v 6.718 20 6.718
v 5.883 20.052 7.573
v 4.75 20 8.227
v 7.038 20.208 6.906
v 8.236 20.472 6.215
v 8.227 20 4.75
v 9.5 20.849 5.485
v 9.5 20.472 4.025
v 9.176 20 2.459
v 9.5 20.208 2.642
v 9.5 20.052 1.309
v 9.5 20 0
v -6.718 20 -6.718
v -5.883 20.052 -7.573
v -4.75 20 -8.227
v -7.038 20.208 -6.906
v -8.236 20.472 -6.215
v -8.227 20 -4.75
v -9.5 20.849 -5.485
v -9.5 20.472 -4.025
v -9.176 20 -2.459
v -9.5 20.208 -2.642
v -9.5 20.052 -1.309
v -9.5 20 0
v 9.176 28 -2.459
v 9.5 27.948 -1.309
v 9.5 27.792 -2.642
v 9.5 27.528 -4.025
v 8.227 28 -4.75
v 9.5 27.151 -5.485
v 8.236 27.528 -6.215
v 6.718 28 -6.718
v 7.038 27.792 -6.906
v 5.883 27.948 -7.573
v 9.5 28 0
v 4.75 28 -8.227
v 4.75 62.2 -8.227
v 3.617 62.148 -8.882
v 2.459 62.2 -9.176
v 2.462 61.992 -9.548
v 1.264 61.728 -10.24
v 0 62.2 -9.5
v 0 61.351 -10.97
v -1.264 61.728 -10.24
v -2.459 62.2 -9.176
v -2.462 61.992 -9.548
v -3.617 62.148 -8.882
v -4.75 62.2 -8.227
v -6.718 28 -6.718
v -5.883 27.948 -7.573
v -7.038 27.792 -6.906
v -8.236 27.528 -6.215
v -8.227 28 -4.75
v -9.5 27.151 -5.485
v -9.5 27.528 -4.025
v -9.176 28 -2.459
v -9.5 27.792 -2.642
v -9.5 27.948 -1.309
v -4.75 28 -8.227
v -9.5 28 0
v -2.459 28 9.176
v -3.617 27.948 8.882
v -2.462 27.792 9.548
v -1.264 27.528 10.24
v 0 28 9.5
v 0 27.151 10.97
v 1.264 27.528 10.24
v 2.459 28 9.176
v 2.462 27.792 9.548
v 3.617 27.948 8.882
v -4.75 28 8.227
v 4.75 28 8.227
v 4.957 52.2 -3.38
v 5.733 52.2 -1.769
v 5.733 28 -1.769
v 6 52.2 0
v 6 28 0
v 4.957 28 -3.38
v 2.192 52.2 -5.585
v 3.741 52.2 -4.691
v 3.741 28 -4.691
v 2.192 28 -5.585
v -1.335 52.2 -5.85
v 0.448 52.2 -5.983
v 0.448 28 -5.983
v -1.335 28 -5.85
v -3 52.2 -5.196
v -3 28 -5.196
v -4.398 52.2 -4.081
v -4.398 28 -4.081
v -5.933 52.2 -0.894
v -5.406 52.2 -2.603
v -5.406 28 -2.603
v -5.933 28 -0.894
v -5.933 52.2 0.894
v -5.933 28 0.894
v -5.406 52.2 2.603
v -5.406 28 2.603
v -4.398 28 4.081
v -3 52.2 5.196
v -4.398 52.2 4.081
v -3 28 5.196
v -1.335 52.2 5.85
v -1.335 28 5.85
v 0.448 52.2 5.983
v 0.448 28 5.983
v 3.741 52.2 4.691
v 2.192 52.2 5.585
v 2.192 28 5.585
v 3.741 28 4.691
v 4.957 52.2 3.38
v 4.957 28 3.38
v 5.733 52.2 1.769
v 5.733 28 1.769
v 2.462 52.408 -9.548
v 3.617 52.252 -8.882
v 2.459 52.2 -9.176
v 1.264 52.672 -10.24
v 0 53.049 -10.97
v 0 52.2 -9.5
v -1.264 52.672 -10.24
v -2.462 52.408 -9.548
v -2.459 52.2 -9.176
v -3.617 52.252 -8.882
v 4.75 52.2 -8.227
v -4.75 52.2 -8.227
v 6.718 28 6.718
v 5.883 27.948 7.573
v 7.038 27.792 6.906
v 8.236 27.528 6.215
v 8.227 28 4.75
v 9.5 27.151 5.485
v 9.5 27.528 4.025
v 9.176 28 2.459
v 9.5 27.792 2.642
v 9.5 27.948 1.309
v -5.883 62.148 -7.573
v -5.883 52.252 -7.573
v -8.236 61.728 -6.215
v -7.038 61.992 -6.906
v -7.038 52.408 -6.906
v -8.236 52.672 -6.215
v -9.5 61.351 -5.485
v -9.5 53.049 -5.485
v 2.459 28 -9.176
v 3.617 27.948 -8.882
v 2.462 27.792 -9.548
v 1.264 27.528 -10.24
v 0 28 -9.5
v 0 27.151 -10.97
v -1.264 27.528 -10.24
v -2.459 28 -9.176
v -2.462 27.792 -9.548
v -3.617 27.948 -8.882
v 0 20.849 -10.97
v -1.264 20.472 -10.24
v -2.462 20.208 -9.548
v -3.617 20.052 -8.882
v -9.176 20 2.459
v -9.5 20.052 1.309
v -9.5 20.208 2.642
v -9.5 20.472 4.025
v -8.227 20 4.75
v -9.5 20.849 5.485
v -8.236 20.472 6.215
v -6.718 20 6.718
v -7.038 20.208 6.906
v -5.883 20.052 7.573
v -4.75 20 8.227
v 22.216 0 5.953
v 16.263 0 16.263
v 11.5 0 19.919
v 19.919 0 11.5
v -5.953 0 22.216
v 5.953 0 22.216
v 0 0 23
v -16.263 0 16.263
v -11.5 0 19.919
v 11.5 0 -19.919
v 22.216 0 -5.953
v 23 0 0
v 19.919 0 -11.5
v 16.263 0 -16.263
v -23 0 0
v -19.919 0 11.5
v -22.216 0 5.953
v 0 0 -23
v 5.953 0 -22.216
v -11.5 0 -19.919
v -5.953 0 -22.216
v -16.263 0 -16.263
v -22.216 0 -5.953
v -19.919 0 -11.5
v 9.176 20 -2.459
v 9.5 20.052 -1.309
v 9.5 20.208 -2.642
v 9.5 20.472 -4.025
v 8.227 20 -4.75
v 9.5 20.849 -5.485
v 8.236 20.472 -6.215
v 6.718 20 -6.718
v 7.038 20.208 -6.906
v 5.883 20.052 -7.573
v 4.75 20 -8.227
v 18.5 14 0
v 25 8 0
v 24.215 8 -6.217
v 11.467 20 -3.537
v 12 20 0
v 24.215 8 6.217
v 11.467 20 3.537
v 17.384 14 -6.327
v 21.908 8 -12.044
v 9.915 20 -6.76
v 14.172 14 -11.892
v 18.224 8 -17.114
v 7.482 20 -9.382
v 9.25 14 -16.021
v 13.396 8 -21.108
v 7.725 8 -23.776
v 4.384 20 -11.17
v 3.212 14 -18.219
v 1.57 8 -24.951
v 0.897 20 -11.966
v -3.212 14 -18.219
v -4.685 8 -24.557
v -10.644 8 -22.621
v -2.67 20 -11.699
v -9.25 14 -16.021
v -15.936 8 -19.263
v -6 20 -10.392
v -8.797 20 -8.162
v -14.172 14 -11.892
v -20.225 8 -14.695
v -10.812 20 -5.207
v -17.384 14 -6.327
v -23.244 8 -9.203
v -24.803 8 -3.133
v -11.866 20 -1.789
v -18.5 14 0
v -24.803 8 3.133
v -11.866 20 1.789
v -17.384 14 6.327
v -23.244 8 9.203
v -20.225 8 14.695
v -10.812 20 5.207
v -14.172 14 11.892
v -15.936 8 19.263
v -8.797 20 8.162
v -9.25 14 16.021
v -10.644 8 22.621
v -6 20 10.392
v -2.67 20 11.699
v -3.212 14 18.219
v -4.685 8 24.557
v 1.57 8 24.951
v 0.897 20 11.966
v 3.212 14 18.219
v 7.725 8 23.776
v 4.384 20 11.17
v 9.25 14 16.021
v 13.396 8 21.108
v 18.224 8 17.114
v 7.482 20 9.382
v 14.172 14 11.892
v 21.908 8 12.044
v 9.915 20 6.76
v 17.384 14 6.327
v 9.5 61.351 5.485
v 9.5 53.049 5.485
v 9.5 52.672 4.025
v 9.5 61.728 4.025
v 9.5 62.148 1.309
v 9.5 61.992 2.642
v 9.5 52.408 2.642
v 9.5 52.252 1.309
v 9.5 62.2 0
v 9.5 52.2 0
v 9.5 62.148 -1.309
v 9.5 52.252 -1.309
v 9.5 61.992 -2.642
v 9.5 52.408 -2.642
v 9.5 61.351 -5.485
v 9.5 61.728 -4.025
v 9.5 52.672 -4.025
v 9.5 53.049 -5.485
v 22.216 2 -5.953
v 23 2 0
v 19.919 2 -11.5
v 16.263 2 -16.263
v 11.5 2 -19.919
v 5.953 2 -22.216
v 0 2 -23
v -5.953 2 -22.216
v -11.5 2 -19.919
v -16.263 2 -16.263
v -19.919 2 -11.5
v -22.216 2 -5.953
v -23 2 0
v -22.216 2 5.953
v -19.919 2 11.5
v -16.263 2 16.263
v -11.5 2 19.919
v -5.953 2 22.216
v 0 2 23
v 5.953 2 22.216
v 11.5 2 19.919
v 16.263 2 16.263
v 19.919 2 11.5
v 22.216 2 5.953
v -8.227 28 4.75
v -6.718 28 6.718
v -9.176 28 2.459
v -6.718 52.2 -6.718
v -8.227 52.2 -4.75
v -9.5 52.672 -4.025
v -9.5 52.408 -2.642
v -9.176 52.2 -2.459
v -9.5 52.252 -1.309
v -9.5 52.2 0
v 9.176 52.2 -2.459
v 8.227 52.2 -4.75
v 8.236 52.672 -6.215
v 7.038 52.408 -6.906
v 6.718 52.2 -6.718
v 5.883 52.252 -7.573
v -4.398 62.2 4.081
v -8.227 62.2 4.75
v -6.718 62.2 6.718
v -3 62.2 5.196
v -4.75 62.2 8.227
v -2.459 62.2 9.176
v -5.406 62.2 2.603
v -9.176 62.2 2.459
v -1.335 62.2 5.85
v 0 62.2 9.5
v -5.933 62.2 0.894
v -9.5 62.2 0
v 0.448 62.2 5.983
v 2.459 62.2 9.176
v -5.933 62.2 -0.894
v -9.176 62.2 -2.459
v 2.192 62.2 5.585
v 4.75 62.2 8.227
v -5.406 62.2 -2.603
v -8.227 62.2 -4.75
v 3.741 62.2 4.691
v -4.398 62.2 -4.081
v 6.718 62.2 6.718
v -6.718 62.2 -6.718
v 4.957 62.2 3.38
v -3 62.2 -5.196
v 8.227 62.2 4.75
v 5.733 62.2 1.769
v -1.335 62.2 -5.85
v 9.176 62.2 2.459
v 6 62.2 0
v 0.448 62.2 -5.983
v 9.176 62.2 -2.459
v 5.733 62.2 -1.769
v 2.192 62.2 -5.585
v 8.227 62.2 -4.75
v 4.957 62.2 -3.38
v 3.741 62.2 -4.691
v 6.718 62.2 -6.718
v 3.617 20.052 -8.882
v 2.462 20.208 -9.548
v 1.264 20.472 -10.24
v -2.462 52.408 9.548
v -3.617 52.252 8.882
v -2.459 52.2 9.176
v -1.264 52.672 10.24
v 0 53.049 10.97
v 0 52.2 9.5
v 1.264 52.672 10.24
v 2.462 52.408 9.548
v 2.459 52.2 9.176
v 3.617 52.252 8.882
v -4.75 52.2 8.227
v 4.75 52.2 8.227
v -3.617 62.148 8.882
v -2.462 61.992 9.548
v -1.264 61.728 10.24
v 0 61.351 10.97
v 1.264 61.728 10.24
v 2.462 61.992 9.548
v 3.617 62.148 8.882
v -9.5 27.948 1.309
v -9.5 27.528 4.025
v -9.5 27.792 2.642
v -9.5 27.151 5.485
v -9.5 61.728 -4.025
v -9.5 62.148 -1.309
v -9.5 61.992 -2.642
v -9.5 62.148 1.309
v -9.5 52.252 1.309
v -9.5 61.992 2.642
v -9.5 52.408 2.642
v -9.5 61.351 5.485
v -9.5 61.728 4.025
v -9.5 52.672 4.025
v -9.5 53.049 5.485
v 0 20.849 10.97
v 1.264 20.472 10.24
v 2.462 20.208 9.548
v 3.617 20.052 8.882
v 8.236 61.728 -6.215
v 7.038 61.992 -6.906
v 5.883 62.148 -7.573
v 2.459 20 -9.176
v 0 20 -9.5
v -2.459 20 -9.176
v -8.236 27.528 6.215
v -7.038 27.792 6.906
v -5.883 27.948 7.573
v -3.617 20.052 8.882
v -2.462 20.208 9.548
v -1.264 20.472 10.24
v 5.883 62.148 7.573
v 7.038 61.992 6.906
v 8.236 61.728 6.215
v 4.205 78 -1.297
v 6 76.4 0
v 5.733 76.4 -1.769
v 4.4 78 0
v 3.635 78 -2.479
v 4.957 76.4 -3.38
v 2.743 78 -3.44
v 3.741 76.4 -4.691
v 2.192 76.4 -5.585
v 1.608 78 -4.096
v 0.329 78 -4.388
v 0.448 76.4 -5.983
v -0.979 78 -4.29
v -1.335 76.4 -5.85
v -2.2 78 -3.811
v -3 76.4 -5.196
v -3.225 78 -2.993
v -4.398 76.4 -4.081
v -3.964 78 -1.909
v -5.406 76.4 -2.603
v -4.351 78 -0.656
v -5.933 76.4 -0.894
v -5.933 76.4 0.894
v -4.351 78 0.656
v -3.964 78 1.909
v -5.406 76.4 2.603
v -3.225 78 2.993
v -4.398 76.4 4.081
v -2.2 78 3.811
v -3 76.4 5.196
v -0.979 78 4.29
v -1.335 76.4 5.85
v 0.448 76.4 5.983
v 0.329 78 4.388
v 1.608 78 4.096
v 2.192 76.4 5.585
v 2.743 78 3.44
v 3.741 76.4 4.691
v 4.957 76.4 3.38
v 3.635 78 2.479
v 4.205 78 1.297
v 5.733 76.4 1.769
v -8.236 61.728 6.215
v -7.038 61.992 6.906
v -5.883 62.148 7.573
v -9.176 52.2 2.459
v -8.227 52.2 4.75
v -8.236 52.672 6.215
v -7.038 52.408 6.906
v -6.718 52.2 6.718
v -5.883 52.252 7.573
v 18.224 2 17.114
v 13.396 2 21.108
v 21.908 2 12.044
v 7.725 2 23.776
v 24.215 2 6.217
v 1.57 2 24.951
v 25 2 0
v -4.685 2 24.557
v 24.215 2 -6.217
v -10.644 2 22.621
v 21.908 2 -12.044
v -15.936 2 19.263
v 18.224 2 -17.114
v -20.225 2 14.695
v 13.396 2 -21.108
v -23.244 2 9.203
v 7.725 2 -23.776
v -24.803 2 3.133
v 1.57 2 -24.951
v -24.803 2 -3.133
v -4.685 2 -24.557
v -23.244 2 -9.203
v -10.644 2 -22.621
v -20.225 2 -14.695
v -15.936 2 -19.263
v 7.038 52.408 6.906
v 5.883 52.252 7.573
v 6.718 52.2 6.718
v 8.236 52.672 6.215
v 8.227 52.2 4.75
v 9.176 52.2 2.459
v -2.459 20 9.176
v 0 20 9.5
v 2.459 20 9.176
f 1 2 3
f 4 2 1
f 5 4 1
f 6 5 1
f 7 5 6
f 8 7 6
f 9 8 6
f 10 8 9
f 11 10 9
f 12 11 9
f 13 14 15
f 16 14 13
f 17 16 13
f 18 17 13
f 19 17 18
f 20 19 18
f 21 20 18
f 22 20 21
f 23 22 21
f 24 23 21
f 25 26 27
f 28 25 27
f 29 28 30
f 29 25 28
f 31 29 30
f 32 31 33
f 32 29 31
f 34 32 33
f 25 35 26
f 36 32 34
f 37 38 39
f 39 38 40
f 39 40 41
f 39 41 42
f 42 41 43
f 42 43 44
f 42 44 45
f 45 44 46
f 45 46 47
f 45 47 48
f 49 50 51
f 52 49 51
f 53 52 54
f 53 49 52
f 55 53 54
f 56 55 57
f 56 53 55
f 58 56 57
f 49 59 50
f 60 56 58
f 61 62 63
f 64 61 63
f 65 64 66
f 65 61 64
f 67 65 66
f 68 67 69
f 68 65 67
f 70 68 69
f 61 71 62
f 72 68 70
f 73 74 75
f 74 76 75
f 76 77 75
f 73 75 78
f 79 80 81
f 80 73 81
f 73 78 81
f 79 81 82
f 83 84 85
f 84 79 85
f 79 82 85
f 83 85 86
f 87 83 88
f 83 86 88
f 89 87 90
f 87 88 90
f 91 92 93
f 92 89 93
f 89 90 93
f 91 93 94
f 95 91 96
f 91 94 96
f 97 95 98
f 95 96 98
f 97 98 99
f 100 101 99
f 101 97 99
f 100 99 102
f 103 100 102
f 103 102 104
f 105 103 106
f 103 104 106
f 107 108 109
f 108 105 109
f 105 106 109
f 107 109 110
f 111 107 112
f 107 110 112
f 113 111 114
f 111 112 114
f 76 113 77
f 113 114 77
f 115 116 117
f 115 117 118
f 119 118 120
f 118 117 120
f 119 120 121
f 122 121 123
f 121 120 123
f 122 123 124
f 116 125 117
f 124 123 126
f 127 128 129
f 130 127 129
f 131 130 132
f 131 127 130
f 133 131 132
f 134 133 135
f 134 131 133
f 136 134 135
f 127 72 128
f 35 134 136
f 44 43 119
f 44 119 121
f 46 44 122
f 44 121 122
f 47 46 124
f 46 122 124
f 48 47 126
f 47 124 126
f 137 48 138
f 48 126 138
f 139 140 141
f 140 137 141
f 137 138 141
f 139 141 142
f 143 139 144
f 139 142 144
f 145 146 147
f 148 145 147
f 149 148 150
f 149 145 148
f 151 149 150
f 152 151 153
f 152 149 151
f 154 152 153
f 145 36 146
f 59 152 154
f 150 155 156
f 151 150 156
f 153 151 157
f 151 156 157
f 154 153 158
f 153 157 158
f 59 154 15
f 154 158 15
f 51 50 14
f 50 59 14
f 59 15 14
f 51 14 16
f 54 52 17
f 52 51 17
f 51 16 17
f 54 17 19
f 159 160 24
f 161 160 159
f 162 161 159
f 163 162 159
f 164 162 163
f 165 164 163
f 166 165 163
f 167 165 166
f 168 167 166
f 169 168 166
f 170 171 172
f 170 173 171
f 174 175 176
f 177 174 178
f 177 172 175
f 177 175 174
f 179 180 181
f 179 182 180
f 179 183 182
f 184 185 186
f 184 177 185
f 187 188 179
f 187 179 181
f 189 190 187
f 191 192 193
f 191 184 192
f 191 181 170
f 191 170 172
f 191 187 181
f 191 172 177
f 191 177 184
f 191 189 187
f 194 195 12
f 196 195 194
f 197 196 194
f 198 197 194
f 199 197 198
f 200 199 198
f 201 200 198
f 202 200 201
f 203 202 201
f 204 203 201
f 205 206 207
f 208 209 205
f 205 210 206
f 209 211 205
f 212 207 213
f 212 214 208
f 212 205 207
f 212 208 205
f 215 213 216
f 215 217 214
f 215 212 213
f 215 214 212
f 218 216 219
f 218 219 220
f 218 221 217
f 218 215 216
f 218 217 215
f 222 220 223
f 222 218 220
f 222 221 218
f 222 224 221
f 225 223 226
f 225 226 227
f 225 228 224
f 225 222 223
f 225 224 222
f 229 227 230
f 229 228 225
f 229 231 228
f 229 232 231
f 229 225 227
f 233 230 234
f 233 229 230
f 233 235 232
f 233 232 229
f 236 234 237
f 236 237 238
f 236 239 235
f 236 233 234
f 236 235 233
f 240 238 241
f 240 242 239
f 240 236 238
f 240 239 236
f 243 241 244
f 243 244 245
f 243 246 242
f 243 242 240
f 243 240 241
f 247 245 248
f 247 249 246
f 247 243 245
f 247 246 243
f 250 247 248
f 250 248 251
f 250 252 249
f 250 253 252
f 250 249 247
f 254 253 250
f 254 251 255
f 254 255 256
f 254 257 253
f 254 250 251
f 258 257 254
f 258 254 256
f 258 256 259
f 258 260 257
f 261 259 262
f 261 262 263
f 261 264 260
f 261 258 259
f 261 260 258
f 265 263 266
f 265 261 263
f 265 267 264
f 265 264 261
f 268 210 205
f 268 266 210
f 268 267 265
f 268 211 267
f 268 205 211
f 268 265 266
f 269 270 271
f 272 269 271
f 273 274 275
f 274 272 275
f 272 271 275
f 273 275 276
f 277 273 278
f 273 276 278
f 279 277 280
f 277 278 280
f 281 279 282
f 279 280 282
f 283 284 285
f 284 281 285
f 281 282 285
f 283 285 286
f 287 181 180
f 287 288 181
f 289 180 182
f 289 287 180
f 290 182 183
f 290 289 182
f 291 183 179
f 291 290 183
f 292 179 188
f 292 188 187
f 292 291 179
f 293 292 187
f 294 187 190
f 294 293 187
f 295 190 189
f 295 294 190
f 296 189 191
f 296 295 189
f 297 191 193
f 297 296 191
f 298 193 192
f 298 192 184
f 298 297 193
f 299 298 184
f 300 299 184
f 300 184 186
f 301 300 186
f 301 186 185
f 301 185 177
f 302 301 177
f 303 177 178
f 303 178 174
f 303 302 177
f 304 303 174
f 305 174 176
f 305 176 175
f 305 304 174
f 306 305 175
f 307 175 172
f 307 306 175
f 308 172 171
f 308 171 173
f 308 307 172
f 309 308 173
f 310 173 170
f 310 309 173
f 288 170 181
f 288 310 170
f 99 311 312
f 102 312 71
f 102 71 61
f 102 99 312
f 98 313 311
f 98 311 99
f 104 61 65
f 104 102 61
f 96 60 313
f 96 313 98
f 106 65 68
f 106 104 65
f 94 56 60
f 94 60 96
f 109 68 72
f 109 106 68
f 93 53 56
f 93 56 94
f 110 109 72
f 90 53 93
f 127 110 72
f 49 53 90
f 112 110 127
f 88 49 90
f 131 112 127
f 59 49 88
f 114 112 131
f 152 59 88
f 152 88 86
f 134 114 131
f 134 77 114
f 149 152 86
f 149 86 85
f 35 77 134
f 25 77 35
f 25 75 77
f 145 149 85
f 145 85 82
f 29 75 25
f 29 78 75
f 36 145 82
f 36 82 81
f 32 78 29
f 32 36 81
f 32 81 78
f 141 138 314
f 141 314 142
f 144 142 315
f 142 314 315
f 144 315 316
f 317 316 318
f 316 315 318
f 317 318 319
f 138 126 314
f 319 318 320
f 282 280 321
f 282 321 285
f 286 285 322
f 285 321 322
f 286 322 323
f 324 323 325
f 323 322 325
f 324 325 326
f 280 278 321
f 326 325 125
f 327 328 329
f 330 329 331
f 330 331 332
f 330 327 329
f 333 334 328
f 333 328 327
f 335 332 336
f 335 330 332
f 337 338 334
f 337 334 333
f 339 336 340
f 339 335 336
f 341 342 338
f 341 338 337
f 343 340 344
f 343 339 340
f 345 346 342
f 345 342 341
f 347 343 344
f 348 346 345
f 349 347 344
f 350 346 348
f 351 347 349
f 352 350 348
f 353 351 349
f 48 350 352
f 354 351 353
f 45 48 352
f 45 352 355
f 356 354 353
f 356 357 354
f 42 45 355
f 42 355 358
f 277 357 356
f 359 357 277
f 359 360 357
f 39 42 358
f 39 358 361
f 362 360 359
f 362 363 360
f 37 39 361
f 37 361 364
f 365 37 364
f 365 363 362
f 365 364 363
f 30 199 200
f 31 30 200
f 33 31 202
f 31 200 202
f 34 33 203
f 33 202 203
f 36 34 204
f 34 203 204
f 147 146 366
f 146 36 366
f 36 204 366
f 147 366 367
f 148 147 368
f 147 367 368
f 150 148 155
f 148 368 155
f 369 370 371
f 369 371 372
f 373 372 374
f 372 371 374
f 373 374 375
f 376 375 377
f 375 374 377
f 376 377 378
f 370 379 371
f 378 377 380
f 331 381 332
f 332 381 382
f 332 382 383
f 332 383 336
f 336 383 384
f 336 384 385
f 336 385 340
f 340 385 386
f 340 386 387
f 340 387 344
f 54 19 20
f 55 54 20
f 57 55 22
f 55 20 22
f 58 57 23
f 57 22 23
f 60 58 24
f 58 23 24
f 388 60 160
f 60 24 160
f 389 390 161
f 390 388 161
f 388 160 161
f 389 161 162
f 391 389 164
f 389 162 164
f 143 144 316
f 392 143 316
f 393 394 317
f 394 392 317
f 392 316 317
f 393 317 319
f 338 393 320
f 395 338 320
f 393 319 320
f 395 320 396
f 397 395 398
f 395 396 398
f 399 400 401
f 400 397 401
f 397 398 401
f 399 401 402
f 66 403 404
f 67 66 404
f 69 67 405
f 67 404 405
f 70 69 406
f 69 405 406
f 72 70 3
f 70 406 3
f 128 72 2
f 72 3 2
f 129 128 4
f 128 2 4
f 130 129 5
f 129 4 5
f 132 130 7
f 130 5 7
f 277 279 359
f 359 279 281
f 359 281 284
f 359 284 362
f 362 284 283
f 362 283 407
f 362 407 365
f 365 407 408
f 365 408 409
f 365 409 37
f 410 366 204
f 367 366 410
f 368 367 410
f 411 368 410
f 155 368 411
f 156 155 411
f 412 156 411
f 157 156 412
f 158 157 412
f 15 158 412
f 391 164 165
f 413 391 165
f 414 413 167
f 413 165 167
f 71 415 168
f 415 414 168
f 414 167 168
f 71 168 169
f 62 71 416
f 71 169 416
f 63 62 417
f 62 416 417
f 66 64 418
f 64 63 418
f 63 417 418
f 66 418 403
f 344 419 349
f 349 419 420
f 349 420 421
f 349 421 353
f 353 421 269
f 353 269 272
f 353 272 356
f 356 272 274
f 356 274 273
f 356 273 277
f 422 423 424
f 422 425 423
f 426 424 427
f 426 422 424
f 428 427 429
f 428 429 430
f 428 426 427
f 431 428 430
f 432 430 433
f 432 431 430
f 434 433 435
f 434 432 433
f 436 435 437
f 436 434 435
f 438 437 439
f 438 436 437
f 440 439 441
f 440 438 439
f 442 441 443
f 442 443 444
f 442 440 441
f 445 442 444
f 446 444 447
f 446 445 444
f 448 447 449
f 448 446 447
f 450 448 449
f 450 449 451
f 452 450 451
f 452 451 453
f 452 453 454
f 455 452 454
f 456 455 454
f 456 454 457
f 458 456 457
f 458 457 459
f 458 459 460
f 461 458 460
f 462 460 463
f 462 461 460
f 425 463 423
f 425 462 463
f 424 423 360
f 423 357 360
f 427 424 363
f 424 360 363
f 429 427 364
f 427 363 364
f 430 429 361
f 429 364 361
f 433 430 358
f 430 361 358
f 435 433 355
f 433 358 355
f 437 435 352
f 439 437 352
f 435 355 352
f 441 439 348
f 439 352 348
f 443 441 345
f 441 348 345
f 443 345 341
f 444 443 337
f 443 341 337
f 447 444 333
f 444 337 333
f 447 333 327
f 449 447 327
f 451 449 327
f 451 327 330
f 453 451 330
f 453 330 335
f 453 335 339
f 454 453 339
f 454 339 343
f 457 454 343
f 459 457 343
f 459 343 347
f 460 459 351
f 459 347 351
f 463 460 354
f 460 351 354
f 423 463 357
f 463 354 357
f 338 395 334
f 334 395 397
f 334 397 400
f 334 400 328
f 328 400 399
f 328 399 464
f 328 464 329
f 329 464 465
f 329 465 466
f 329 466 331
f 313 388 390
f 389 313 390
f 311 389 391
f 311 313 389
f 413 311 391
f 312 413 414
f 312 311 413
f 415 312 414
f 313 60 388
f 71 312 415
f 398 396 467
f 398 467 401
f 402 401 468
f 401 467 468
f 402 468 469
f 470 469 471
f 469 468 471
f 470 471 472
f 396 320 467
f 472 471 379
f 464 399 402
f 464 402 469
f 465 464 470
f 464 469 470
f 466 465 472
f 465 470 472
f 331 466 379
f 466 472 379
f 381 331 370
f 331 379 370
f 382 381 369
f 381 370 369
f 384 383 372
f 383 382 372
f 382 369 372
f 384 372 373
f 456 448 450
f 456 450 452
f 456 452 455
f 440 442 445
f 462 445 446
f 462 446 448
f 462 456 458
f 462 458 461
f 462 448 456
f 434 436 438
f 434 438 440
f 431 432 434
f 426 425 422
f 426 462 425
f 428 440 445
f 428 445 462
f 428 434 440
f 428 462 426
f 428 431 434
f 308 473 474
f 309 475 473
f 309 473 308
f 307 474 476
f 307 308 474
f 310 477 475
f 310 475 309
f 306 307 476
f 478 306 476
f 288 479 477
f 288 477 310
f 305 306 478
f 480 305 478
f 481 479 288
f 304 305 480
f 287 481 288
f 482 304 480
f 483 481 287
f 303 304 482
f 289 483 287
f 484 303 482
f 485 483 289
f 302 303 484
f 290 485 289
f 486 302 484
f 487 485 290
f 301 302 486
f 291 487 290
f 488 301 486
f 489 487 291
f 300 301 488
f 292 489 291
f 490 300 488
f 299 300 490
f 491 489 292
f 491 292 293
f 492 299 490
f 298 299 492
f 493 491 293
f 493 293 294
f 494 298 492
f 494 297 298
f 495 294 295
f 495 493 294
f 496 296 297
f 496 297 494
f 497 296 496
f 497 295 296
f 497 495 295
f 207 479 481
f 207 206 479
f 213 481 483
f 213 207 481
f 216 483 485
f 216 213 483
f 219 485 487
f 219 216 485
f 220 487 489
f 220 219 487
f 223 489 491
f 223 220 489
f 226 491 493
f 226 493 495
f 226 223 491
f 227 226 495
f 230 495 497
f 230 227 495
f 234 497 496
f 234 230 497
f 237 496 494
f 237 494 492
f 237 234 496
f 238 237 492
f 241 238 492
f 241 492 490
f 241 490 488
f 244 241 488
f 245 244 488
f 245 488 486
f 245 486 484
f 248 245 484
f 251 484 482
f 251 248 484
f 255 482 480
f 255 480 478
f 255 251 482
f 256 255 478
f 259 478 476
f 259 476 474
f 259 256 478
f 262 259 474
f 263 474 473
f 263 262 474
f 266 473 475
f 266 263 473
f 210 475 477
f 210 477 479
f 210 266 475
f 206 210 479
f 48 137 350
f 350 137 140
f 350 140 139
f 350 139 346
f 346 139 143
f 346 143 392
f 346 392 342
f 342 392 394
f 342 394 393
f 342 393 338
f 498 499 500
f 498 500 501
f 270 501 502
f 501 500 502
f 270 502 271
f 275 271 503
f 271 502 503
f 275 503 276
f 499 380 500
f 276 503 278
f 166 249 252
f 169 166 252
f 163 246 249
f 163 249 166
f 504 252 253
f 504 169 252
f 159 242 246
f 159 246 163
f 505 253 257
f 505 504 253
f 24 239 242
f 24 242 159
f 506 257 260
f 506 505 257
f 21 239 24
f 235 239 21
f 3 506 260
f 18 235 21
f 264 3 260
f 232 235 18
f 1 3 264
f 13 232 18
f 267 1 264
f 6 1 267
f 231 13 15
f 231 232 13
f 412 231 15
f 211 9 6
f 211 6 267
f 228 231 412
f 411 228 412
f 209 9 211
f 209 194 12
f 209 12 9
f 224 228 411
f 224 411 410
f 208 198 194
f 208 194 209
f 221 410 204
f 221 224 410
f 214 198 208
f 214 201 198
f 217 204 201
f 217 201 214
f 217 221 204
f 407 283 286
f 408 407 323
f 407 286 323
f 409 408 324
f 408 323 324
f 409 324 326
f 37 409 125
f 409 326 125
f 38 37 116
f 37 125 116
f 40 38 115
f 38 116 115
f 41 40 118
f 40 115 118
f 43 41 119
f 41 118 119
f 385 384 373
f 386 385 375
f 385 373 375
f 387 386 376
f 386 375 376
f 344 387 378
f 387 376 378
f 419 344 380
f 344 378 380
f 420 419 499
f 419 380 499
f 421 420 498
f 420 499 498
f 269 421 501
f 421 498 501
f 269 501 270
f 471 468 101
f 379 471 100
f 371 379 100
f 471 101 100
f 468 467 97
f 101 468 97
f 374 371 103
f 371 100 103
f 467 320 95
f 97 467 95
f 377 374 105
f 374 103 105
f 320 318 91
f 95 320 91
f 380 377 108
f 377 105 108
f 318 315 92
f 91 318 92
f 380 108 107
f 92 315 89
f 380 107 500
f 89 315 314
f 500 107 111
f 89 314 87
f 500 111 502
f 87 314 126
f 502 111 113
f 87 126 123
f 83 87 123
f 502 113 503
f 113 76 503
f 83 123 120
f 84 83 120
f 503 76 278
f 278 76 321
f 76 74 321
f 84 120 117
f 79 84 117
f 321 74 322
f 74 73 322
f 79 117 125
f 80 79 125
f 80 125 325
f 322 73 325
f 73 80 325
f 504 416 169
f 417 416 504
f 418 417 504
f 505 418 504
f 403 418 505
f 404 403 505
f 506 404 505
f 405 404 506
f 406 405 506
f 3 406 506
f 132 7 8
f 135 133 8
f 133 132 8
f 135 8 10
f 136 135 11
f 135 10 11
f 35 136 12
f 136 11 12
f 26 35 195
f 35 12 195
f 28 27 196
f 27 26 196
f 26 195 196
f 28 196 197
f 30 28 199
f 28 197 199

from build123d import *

# Parameters (mm, degrees)
EXTRUDE_1_DEPTH = 8
EXTRUDE_2_DEPTH = 10


with BuildPart() as part:
    # Эскиз1 → Повернуть1 (revolve)
    with BuildSketch(Plane.XY, mode=Mode.PRIVATE) as revolve_1_sk:
        Polygon((0, 0), (-23, 0), (-23, 2), (-25, 2), (-25, 8), (-12, 20), (-6, 20), (-6, 28), (-6, 76.4), (-4.4, 78), (0, 78), align=None)
    revolve(revolve_1_sk.sketch.rotate(Axis((0, 0, 0), (0, 1, 0)), 180), axis=Axis((0, 0, 0), (0, 1, 0)))  # turned: the seam where the file's is

    # Эскиз2 → Бобышка-Вытянуть1 (add)
    with BuildSketch(Plane(origin=(0, 20, 0), x_dir=(1, 0, 0), z_dir=(0, 1, 0))):
        Polygon((0, 10.969655115), (-9.5, 5.484827557), (-9.5, -5.484827557), (0, -10.969655115), (9.5, -5.484827557), (9.5, 5.484827557), align=None)
    extrude(amount=EXTRUDE_1_DEPTH)

    # Эскиз3 → Бобышка-Вытянуть2 (add)
    with BuildSketch(Plane(origin=(0, 52.2, 0), x_dir=(1, 0, 0), z_dir=(0, 1, 0))):
        Polygon((9.5, 5.484827557), (0, 10.969655115), (-9.5, 5.484827557), (-9.5, -5.484827557), (0, -10.969655115), (9.5, -5.484827557), align=None)
    extrude(amount=EXTRUDE_2_DEPTH)

    # Эскиз4 → Вырез-Повернуть2 (revolve, cut)
    with BuildSketch(Plane.XY, mode=Mode.PRIVATE) as cut_revolve_2_sk:
        Polygon((-18.160254038, 62.2), (-9.5, 62.2), (-18.160254038, 57.2), align=None)
        Polygon((-18.160254038, 52.2), (-18.160254038, 57.2), (-9.5, 52.2), align=None)
        Polygon((-16.42820323, 28), (-16.42820323, 24), (-9.5, 28), align=None)
        Polygon((-16.42820323, 24), (-16.42820323, 20), (-9.5, 20), align=None)
    revolve(cut_revolve_2_sk.sketch.rotate(Axis((0, 78, 0), (0, 1, 0)), 180), axis=Axis((0, 78, 0), (0, 1, 0)), mode=Mode.SUBTRACT)  # turned: the seam where the file's is


solid = part.part
